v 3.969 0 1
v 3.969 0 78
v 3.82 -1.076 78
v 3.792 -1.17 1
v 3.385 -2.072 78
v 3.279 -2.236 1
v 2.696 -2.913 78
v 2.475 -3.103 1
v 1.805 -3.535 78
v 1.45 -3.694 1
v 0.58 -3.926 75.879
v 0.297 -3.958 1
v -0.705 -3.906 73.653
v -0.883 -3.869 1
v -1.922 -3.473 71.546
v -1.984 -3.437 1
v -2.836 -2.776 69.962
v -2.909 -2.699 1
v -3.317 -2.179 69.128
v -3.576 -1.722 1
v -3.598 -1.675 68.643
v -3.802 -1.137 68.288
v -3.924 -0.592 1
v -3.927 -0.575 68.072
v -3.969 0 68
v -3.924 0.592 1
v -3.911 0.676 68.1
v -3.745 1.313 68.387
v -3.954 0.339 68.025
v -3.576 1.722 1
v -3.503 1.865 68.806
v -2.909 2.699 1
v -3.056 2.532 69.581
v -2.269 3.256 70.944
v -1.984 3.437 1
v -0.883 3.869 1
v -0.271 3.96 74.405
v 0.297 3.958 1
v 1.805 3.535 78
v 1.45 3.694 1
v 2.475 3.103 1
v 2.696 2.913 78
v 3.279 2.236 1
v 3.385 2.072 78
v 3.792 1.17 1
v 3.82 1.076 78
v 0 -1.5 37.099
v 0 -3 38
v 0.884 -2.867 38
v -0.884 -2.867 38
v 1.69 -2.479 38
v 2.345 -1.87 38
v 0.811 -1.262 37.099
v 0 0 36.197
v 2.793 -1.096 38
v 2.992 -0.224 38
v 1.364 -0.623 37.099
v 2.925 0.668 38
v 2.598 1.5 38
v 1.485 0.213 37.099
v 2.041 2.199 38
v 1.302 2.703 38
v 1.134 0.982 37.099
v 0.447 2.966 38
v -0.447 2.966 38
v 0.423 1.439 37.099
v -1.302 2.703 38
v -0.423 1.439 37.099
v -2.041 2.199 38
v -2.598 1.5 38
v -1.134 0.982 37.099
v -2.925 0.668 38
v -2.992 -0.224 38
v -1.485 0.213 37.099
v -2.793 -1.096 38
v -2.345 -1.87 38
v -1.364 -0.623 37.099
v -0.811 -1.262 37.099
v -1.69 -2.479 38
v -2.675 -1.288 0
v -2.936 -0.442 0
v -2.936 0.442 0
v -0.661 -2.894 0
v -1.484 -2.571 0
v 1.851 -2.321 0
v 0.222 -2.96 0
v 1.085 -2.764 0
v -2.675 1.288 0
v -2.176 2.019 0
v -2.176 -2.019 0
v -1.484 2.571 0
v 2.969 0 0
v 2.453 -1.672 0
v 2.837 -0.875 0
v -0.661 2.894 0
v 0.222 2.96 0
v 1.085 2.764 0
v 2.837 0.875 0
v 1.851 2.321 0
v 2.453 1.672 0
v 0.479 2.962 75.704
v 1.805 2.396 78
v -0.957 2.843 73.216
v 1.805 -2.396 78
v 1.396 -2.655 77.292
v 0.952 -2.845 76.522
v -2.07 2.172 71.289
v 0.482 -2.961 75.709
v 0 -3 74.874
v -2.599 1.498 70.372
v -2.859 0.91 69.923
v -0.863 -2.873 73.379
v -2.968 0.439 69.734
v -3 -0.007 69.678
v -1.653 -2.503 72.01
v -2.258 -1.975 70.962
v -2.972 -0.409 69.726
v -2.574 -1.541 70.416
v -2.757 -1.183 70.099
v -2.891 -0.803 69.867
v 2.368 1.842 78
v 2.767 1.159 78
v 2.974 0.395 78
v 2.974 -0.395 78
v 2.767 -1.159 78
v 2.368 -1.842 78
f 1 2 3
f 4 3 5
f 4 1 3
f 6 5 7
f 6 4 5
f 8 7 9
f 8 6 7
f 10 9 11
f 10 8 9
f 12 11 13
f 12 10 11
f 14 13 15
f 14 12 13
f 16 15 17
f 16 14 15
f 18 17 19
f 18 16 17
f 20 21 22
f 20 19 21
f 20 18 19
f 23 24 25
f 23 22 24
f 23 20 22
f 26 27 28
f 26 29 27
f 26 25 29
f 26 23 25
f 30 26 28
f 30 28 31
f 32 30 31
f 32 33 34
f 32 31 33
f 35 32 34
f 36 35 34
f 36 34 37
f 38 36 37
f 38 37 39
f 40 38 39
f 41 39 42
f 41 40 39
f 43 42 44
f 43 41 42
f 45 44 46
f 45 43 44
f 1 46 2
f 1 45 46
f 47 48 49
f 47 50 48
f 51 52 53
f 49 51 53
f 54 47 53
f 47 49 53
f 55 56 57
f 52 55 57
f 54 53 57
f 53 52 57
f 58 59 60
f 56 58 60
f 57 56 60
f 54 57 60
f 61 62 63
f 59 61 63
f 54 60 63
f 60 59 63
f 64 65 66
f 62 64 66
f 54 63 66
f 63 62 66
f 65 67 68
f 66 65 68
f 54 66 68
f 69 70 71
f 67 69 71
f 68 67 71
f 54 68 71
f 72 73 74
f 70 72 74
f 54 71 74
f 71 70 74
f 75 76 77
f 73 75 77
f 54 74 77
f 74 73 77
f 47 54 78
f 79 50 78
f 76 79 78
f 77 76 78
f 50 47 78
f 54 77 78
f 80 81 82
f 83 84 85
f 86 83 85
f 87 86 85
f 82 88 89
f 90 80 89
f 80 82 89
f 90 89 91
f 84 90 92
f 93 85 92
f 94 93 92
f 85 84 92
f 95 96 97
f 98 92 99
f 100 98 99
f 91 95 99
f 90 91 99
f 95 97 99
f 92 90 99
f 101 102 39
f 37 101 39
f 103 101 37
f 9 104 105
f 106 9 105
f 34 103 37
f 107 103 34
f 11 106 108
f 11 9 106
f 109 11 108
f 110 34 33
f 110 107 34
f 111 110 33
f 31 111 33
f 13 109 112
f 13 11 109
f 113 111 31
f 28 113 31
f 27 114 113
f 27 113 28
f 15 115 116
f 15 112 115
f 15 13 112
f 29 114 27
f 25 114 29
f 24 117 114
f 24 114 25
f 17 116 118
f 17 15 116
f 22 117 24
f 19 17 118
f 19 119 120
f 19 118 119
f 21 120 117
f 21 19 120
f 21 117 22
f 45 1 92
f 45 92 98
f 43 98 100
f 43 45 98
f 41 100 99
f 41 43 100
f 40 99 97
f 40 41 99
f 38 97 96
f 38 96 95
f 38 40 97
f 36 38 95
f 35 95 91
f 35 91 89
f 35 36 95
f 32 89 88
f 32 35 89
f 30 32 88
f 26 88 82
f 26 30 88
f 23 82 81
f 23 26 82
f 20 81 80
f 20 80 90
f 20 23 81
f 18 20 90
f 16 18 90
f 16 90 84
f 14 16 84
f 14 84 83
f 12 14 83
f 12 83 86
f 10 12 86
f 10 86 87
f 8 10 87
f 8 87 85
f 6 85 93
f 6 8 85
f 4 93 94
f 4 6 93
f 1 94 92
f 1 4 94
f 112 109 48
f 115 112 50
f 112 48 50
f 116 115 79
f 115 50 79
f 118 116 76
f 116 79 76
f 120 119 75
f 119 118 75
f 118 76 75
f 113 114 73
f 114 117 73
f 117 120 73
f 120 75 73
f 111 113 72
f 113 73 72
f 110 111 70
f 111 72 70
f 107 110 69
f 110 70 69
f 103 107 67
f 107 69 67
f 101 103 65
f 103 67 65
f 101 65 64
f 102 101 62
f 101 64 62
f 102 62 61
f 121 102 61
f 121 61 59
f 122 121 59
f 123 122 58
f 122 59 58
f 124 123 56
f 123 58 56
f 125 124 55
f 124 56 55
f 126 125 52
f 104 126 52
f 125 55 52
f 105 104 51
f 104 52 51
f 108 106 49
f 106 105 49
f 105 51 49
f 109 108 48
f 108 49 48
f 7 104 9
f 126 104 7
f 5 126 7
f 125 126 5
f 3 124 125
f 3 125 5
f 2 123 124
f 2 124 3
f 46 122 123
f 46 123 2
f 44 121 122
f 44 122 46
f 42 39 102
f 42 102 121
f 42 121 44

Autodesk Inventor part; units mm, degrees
ref_plane "YZ Plane" through (0, 0, 0) normal (1, 0, 0) x (0, 1, 0)
ref_plane "XZ Plane" through (0, 0, 0) normal (0, 1, 0) x (-1, 0, 0)
ref_plane "XY Plane" through (0, 0, 0) normal (0, 0, 1) x (1, 0, 0)
sketch "Sketch1" plane through (0, 0, 0) normal (0, 0, 1) x (1, 0, 0)
  circle A0 centre (0, 0) radius 3.9688
  dimension "d0" = 7.9375
extrude "Extrusion1" add sketch "Sketch1" along normal blind 78
thread "Thread1" size "M8x1.25" class "6g" standard "ANSI Metric M Profile" length 20
sketch "Sketch2" plane through (0, 0, 78) normal (0, 0, 1) x (1, 0, 0)
  circle A0 centre (0, 0) radius 3.9687 projected
hole "Hole1" at (0, 0, 78) direction (0, 0, -1) diameter 6 depth 40 tip angle 118
sketch "Sketch3" plane through (0, 0, 0) normal (0, 1, 0) x (-1, 0, 0)
  line L0 (-3.9688, 78) -> (3.9688, 78) projected
  line L1 (-3.9688, 0) -> (3.9688, 0) projected
  line L2 (-1.8048, 78) -> (3.9688, 68)
  line L3 (3.9688, 0) -> (3.9688, 78) projected
  line L4 (-3.9688, 0) -> (-3.9688, 78) projected
  point P0 (0, 0)
  dimension "d12" = 30
  dimension "d13" = 10
extrude "Extrusion2" cut sketch "Sketch3" along normal mid plane 20 contours L0 L3 L2
chamfer "Chamfer1" distance 1 angle 45 1 edges at (-3.9688, 0, 0)
properties part number "ESCAPAMENTO(16)" material "Carbon Steel"
